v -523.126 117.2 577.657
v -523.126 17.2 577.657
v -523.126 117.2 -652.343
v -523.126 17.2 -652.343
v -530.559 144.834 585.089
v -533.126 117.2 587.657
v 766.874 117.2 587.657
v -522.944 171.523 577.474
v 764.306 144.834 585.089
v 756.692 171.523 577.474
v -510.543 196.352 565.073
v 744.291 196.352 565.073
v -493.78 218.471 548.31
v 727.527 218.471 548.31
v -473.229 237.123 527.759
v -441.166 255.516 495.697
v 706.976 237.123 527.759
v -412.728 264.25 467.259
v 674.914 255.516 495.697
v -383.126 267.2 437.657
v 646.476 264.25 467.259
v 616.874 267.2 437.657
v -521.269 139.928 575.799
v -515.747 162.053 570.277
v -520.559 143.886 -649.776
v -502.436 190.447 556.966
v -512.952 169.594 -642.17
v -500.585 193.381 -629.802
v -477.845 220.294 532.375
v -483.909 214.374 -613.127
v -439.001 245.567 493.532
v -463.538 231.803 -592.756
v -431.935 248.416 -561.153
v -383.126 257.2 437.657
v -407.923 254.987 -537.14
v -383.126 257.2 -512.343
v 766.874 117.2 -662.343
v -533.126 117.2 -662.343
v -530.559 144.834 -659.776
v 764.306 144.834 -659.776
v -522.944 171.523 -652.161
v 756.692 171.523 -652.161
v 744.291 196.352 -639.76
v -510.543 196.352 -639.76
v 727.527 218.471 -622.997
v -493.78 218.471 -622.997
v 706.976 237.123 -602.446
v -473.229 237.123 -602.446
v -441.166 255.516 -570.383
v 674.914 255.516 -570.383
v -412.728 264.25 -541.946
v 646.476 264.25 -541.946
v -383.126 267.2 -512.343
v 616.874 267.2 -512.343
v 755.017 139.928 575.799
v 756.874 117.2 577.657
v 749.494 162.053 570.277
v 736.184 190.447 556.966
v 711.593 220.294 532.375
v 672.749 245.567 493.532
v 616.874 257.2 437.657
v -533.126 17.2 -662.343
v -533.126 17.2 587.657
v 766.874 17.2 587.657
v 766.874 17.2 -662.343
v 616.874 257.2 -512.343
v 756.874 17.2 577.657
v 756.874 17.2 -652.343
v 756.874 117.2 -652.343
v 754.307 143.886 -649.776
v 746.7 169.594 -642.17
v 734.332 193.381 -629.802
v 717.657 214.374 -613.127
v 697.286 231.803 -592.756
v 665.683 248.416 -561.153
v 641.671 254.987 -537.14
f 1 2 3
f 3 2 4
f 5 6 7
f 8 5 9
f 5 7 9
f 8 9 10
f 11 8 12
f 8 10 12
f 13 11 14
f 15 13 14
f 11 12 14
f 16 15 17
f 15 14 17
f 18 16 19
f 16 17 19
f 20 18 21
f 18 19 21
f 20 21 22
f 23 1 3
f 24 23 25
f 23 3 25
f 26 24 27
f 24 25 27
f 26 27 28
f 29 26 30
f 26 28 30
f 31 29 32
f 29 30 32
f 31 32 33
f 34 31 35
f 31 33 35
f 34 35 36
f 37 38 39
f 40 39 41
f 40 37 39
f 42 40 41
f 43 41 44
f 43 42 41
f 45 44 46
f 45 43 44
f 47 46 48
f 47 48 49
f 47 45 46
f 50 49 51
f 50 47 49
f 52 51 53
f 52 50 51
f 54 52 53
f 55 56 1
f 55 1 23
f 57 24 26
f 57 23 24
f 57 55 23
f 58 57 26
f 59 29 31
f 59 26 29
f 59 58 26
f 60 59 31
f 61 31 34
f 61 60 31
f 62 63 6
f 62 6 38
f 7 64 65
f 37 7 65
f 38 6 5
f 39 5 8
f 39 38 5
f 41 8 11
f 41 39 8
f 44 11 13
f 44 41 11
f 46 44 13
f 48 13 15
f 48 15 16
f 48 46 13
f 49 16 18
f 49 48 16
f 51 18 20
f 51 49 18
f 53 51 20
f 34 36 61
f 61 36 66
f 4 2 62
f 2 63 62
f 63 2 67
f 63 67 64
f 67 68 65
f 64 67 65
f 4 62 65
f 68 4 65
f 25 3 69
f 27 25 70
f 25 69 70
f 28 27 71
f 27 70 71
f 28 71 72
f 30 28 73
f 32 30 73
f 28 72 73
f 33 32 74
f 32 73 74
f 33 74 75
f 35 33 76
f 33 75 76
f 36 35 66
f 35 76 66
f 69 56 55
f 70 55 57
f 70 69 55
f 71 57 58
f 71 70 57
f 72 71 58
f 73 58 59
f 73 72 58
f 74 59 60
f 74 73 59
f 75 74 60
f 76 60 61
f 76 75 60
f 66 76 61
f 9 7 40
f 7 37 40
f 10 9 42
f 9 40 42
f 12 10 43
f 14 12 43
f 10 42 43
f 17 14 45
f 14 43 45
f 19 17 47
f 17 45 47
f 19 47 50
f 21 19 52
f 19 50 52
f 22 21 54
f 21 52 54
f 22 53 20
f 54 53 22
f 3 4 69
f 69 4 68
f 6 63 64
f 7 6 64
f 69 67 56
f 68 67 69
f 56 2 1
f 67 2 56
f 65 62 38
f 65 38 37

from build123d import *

# Parameters (mm, degrees)
SKETCH2_W           = 1300
SKETCH2_H           = 1250
BOSS_EXTRUDE1_DEPTH = 250
FILLET2_R           = 150
SHELL3_T            = -10


with BuildPart() as part:
    # Sketch2 → Boss-Extrude1 (new body)
    with BuildSketch(Plane(origin=(0, 17.2, 0), x_dir=(1, 0, 0), z_dir=(0, 1, 0))):
        with Locations((116.873880354, 37.343378517)):
            Rectangle(SKETCH2_W, SKETCH2_H)
    extrude(amount=BOSS_EXTRUDE1_DEPTH)

    # Fillet2
    fillet2_edges = [part.edges().sort_by_distance(p)[0] for p in [
        (116.873880354, 267.2, 587.656621483),
        (766.873880354, 267.2, -37.343378517),
        (116.873880354, 267.2, -662.343378517),
        (-533.126119646, 267.2, -37.343378517),
    ]]
    fillet(fillet2_edges, radius=FILLET2_R)

    # Shell3
    shell3_openings = [part.faces().sort_by_distance(p)[0] for p in [
        (116.873880354, 17.2, -37.343378517),
    ]]
    offset(amount=SHELL3_T, openings=shell3_openings)


solid = part.part
